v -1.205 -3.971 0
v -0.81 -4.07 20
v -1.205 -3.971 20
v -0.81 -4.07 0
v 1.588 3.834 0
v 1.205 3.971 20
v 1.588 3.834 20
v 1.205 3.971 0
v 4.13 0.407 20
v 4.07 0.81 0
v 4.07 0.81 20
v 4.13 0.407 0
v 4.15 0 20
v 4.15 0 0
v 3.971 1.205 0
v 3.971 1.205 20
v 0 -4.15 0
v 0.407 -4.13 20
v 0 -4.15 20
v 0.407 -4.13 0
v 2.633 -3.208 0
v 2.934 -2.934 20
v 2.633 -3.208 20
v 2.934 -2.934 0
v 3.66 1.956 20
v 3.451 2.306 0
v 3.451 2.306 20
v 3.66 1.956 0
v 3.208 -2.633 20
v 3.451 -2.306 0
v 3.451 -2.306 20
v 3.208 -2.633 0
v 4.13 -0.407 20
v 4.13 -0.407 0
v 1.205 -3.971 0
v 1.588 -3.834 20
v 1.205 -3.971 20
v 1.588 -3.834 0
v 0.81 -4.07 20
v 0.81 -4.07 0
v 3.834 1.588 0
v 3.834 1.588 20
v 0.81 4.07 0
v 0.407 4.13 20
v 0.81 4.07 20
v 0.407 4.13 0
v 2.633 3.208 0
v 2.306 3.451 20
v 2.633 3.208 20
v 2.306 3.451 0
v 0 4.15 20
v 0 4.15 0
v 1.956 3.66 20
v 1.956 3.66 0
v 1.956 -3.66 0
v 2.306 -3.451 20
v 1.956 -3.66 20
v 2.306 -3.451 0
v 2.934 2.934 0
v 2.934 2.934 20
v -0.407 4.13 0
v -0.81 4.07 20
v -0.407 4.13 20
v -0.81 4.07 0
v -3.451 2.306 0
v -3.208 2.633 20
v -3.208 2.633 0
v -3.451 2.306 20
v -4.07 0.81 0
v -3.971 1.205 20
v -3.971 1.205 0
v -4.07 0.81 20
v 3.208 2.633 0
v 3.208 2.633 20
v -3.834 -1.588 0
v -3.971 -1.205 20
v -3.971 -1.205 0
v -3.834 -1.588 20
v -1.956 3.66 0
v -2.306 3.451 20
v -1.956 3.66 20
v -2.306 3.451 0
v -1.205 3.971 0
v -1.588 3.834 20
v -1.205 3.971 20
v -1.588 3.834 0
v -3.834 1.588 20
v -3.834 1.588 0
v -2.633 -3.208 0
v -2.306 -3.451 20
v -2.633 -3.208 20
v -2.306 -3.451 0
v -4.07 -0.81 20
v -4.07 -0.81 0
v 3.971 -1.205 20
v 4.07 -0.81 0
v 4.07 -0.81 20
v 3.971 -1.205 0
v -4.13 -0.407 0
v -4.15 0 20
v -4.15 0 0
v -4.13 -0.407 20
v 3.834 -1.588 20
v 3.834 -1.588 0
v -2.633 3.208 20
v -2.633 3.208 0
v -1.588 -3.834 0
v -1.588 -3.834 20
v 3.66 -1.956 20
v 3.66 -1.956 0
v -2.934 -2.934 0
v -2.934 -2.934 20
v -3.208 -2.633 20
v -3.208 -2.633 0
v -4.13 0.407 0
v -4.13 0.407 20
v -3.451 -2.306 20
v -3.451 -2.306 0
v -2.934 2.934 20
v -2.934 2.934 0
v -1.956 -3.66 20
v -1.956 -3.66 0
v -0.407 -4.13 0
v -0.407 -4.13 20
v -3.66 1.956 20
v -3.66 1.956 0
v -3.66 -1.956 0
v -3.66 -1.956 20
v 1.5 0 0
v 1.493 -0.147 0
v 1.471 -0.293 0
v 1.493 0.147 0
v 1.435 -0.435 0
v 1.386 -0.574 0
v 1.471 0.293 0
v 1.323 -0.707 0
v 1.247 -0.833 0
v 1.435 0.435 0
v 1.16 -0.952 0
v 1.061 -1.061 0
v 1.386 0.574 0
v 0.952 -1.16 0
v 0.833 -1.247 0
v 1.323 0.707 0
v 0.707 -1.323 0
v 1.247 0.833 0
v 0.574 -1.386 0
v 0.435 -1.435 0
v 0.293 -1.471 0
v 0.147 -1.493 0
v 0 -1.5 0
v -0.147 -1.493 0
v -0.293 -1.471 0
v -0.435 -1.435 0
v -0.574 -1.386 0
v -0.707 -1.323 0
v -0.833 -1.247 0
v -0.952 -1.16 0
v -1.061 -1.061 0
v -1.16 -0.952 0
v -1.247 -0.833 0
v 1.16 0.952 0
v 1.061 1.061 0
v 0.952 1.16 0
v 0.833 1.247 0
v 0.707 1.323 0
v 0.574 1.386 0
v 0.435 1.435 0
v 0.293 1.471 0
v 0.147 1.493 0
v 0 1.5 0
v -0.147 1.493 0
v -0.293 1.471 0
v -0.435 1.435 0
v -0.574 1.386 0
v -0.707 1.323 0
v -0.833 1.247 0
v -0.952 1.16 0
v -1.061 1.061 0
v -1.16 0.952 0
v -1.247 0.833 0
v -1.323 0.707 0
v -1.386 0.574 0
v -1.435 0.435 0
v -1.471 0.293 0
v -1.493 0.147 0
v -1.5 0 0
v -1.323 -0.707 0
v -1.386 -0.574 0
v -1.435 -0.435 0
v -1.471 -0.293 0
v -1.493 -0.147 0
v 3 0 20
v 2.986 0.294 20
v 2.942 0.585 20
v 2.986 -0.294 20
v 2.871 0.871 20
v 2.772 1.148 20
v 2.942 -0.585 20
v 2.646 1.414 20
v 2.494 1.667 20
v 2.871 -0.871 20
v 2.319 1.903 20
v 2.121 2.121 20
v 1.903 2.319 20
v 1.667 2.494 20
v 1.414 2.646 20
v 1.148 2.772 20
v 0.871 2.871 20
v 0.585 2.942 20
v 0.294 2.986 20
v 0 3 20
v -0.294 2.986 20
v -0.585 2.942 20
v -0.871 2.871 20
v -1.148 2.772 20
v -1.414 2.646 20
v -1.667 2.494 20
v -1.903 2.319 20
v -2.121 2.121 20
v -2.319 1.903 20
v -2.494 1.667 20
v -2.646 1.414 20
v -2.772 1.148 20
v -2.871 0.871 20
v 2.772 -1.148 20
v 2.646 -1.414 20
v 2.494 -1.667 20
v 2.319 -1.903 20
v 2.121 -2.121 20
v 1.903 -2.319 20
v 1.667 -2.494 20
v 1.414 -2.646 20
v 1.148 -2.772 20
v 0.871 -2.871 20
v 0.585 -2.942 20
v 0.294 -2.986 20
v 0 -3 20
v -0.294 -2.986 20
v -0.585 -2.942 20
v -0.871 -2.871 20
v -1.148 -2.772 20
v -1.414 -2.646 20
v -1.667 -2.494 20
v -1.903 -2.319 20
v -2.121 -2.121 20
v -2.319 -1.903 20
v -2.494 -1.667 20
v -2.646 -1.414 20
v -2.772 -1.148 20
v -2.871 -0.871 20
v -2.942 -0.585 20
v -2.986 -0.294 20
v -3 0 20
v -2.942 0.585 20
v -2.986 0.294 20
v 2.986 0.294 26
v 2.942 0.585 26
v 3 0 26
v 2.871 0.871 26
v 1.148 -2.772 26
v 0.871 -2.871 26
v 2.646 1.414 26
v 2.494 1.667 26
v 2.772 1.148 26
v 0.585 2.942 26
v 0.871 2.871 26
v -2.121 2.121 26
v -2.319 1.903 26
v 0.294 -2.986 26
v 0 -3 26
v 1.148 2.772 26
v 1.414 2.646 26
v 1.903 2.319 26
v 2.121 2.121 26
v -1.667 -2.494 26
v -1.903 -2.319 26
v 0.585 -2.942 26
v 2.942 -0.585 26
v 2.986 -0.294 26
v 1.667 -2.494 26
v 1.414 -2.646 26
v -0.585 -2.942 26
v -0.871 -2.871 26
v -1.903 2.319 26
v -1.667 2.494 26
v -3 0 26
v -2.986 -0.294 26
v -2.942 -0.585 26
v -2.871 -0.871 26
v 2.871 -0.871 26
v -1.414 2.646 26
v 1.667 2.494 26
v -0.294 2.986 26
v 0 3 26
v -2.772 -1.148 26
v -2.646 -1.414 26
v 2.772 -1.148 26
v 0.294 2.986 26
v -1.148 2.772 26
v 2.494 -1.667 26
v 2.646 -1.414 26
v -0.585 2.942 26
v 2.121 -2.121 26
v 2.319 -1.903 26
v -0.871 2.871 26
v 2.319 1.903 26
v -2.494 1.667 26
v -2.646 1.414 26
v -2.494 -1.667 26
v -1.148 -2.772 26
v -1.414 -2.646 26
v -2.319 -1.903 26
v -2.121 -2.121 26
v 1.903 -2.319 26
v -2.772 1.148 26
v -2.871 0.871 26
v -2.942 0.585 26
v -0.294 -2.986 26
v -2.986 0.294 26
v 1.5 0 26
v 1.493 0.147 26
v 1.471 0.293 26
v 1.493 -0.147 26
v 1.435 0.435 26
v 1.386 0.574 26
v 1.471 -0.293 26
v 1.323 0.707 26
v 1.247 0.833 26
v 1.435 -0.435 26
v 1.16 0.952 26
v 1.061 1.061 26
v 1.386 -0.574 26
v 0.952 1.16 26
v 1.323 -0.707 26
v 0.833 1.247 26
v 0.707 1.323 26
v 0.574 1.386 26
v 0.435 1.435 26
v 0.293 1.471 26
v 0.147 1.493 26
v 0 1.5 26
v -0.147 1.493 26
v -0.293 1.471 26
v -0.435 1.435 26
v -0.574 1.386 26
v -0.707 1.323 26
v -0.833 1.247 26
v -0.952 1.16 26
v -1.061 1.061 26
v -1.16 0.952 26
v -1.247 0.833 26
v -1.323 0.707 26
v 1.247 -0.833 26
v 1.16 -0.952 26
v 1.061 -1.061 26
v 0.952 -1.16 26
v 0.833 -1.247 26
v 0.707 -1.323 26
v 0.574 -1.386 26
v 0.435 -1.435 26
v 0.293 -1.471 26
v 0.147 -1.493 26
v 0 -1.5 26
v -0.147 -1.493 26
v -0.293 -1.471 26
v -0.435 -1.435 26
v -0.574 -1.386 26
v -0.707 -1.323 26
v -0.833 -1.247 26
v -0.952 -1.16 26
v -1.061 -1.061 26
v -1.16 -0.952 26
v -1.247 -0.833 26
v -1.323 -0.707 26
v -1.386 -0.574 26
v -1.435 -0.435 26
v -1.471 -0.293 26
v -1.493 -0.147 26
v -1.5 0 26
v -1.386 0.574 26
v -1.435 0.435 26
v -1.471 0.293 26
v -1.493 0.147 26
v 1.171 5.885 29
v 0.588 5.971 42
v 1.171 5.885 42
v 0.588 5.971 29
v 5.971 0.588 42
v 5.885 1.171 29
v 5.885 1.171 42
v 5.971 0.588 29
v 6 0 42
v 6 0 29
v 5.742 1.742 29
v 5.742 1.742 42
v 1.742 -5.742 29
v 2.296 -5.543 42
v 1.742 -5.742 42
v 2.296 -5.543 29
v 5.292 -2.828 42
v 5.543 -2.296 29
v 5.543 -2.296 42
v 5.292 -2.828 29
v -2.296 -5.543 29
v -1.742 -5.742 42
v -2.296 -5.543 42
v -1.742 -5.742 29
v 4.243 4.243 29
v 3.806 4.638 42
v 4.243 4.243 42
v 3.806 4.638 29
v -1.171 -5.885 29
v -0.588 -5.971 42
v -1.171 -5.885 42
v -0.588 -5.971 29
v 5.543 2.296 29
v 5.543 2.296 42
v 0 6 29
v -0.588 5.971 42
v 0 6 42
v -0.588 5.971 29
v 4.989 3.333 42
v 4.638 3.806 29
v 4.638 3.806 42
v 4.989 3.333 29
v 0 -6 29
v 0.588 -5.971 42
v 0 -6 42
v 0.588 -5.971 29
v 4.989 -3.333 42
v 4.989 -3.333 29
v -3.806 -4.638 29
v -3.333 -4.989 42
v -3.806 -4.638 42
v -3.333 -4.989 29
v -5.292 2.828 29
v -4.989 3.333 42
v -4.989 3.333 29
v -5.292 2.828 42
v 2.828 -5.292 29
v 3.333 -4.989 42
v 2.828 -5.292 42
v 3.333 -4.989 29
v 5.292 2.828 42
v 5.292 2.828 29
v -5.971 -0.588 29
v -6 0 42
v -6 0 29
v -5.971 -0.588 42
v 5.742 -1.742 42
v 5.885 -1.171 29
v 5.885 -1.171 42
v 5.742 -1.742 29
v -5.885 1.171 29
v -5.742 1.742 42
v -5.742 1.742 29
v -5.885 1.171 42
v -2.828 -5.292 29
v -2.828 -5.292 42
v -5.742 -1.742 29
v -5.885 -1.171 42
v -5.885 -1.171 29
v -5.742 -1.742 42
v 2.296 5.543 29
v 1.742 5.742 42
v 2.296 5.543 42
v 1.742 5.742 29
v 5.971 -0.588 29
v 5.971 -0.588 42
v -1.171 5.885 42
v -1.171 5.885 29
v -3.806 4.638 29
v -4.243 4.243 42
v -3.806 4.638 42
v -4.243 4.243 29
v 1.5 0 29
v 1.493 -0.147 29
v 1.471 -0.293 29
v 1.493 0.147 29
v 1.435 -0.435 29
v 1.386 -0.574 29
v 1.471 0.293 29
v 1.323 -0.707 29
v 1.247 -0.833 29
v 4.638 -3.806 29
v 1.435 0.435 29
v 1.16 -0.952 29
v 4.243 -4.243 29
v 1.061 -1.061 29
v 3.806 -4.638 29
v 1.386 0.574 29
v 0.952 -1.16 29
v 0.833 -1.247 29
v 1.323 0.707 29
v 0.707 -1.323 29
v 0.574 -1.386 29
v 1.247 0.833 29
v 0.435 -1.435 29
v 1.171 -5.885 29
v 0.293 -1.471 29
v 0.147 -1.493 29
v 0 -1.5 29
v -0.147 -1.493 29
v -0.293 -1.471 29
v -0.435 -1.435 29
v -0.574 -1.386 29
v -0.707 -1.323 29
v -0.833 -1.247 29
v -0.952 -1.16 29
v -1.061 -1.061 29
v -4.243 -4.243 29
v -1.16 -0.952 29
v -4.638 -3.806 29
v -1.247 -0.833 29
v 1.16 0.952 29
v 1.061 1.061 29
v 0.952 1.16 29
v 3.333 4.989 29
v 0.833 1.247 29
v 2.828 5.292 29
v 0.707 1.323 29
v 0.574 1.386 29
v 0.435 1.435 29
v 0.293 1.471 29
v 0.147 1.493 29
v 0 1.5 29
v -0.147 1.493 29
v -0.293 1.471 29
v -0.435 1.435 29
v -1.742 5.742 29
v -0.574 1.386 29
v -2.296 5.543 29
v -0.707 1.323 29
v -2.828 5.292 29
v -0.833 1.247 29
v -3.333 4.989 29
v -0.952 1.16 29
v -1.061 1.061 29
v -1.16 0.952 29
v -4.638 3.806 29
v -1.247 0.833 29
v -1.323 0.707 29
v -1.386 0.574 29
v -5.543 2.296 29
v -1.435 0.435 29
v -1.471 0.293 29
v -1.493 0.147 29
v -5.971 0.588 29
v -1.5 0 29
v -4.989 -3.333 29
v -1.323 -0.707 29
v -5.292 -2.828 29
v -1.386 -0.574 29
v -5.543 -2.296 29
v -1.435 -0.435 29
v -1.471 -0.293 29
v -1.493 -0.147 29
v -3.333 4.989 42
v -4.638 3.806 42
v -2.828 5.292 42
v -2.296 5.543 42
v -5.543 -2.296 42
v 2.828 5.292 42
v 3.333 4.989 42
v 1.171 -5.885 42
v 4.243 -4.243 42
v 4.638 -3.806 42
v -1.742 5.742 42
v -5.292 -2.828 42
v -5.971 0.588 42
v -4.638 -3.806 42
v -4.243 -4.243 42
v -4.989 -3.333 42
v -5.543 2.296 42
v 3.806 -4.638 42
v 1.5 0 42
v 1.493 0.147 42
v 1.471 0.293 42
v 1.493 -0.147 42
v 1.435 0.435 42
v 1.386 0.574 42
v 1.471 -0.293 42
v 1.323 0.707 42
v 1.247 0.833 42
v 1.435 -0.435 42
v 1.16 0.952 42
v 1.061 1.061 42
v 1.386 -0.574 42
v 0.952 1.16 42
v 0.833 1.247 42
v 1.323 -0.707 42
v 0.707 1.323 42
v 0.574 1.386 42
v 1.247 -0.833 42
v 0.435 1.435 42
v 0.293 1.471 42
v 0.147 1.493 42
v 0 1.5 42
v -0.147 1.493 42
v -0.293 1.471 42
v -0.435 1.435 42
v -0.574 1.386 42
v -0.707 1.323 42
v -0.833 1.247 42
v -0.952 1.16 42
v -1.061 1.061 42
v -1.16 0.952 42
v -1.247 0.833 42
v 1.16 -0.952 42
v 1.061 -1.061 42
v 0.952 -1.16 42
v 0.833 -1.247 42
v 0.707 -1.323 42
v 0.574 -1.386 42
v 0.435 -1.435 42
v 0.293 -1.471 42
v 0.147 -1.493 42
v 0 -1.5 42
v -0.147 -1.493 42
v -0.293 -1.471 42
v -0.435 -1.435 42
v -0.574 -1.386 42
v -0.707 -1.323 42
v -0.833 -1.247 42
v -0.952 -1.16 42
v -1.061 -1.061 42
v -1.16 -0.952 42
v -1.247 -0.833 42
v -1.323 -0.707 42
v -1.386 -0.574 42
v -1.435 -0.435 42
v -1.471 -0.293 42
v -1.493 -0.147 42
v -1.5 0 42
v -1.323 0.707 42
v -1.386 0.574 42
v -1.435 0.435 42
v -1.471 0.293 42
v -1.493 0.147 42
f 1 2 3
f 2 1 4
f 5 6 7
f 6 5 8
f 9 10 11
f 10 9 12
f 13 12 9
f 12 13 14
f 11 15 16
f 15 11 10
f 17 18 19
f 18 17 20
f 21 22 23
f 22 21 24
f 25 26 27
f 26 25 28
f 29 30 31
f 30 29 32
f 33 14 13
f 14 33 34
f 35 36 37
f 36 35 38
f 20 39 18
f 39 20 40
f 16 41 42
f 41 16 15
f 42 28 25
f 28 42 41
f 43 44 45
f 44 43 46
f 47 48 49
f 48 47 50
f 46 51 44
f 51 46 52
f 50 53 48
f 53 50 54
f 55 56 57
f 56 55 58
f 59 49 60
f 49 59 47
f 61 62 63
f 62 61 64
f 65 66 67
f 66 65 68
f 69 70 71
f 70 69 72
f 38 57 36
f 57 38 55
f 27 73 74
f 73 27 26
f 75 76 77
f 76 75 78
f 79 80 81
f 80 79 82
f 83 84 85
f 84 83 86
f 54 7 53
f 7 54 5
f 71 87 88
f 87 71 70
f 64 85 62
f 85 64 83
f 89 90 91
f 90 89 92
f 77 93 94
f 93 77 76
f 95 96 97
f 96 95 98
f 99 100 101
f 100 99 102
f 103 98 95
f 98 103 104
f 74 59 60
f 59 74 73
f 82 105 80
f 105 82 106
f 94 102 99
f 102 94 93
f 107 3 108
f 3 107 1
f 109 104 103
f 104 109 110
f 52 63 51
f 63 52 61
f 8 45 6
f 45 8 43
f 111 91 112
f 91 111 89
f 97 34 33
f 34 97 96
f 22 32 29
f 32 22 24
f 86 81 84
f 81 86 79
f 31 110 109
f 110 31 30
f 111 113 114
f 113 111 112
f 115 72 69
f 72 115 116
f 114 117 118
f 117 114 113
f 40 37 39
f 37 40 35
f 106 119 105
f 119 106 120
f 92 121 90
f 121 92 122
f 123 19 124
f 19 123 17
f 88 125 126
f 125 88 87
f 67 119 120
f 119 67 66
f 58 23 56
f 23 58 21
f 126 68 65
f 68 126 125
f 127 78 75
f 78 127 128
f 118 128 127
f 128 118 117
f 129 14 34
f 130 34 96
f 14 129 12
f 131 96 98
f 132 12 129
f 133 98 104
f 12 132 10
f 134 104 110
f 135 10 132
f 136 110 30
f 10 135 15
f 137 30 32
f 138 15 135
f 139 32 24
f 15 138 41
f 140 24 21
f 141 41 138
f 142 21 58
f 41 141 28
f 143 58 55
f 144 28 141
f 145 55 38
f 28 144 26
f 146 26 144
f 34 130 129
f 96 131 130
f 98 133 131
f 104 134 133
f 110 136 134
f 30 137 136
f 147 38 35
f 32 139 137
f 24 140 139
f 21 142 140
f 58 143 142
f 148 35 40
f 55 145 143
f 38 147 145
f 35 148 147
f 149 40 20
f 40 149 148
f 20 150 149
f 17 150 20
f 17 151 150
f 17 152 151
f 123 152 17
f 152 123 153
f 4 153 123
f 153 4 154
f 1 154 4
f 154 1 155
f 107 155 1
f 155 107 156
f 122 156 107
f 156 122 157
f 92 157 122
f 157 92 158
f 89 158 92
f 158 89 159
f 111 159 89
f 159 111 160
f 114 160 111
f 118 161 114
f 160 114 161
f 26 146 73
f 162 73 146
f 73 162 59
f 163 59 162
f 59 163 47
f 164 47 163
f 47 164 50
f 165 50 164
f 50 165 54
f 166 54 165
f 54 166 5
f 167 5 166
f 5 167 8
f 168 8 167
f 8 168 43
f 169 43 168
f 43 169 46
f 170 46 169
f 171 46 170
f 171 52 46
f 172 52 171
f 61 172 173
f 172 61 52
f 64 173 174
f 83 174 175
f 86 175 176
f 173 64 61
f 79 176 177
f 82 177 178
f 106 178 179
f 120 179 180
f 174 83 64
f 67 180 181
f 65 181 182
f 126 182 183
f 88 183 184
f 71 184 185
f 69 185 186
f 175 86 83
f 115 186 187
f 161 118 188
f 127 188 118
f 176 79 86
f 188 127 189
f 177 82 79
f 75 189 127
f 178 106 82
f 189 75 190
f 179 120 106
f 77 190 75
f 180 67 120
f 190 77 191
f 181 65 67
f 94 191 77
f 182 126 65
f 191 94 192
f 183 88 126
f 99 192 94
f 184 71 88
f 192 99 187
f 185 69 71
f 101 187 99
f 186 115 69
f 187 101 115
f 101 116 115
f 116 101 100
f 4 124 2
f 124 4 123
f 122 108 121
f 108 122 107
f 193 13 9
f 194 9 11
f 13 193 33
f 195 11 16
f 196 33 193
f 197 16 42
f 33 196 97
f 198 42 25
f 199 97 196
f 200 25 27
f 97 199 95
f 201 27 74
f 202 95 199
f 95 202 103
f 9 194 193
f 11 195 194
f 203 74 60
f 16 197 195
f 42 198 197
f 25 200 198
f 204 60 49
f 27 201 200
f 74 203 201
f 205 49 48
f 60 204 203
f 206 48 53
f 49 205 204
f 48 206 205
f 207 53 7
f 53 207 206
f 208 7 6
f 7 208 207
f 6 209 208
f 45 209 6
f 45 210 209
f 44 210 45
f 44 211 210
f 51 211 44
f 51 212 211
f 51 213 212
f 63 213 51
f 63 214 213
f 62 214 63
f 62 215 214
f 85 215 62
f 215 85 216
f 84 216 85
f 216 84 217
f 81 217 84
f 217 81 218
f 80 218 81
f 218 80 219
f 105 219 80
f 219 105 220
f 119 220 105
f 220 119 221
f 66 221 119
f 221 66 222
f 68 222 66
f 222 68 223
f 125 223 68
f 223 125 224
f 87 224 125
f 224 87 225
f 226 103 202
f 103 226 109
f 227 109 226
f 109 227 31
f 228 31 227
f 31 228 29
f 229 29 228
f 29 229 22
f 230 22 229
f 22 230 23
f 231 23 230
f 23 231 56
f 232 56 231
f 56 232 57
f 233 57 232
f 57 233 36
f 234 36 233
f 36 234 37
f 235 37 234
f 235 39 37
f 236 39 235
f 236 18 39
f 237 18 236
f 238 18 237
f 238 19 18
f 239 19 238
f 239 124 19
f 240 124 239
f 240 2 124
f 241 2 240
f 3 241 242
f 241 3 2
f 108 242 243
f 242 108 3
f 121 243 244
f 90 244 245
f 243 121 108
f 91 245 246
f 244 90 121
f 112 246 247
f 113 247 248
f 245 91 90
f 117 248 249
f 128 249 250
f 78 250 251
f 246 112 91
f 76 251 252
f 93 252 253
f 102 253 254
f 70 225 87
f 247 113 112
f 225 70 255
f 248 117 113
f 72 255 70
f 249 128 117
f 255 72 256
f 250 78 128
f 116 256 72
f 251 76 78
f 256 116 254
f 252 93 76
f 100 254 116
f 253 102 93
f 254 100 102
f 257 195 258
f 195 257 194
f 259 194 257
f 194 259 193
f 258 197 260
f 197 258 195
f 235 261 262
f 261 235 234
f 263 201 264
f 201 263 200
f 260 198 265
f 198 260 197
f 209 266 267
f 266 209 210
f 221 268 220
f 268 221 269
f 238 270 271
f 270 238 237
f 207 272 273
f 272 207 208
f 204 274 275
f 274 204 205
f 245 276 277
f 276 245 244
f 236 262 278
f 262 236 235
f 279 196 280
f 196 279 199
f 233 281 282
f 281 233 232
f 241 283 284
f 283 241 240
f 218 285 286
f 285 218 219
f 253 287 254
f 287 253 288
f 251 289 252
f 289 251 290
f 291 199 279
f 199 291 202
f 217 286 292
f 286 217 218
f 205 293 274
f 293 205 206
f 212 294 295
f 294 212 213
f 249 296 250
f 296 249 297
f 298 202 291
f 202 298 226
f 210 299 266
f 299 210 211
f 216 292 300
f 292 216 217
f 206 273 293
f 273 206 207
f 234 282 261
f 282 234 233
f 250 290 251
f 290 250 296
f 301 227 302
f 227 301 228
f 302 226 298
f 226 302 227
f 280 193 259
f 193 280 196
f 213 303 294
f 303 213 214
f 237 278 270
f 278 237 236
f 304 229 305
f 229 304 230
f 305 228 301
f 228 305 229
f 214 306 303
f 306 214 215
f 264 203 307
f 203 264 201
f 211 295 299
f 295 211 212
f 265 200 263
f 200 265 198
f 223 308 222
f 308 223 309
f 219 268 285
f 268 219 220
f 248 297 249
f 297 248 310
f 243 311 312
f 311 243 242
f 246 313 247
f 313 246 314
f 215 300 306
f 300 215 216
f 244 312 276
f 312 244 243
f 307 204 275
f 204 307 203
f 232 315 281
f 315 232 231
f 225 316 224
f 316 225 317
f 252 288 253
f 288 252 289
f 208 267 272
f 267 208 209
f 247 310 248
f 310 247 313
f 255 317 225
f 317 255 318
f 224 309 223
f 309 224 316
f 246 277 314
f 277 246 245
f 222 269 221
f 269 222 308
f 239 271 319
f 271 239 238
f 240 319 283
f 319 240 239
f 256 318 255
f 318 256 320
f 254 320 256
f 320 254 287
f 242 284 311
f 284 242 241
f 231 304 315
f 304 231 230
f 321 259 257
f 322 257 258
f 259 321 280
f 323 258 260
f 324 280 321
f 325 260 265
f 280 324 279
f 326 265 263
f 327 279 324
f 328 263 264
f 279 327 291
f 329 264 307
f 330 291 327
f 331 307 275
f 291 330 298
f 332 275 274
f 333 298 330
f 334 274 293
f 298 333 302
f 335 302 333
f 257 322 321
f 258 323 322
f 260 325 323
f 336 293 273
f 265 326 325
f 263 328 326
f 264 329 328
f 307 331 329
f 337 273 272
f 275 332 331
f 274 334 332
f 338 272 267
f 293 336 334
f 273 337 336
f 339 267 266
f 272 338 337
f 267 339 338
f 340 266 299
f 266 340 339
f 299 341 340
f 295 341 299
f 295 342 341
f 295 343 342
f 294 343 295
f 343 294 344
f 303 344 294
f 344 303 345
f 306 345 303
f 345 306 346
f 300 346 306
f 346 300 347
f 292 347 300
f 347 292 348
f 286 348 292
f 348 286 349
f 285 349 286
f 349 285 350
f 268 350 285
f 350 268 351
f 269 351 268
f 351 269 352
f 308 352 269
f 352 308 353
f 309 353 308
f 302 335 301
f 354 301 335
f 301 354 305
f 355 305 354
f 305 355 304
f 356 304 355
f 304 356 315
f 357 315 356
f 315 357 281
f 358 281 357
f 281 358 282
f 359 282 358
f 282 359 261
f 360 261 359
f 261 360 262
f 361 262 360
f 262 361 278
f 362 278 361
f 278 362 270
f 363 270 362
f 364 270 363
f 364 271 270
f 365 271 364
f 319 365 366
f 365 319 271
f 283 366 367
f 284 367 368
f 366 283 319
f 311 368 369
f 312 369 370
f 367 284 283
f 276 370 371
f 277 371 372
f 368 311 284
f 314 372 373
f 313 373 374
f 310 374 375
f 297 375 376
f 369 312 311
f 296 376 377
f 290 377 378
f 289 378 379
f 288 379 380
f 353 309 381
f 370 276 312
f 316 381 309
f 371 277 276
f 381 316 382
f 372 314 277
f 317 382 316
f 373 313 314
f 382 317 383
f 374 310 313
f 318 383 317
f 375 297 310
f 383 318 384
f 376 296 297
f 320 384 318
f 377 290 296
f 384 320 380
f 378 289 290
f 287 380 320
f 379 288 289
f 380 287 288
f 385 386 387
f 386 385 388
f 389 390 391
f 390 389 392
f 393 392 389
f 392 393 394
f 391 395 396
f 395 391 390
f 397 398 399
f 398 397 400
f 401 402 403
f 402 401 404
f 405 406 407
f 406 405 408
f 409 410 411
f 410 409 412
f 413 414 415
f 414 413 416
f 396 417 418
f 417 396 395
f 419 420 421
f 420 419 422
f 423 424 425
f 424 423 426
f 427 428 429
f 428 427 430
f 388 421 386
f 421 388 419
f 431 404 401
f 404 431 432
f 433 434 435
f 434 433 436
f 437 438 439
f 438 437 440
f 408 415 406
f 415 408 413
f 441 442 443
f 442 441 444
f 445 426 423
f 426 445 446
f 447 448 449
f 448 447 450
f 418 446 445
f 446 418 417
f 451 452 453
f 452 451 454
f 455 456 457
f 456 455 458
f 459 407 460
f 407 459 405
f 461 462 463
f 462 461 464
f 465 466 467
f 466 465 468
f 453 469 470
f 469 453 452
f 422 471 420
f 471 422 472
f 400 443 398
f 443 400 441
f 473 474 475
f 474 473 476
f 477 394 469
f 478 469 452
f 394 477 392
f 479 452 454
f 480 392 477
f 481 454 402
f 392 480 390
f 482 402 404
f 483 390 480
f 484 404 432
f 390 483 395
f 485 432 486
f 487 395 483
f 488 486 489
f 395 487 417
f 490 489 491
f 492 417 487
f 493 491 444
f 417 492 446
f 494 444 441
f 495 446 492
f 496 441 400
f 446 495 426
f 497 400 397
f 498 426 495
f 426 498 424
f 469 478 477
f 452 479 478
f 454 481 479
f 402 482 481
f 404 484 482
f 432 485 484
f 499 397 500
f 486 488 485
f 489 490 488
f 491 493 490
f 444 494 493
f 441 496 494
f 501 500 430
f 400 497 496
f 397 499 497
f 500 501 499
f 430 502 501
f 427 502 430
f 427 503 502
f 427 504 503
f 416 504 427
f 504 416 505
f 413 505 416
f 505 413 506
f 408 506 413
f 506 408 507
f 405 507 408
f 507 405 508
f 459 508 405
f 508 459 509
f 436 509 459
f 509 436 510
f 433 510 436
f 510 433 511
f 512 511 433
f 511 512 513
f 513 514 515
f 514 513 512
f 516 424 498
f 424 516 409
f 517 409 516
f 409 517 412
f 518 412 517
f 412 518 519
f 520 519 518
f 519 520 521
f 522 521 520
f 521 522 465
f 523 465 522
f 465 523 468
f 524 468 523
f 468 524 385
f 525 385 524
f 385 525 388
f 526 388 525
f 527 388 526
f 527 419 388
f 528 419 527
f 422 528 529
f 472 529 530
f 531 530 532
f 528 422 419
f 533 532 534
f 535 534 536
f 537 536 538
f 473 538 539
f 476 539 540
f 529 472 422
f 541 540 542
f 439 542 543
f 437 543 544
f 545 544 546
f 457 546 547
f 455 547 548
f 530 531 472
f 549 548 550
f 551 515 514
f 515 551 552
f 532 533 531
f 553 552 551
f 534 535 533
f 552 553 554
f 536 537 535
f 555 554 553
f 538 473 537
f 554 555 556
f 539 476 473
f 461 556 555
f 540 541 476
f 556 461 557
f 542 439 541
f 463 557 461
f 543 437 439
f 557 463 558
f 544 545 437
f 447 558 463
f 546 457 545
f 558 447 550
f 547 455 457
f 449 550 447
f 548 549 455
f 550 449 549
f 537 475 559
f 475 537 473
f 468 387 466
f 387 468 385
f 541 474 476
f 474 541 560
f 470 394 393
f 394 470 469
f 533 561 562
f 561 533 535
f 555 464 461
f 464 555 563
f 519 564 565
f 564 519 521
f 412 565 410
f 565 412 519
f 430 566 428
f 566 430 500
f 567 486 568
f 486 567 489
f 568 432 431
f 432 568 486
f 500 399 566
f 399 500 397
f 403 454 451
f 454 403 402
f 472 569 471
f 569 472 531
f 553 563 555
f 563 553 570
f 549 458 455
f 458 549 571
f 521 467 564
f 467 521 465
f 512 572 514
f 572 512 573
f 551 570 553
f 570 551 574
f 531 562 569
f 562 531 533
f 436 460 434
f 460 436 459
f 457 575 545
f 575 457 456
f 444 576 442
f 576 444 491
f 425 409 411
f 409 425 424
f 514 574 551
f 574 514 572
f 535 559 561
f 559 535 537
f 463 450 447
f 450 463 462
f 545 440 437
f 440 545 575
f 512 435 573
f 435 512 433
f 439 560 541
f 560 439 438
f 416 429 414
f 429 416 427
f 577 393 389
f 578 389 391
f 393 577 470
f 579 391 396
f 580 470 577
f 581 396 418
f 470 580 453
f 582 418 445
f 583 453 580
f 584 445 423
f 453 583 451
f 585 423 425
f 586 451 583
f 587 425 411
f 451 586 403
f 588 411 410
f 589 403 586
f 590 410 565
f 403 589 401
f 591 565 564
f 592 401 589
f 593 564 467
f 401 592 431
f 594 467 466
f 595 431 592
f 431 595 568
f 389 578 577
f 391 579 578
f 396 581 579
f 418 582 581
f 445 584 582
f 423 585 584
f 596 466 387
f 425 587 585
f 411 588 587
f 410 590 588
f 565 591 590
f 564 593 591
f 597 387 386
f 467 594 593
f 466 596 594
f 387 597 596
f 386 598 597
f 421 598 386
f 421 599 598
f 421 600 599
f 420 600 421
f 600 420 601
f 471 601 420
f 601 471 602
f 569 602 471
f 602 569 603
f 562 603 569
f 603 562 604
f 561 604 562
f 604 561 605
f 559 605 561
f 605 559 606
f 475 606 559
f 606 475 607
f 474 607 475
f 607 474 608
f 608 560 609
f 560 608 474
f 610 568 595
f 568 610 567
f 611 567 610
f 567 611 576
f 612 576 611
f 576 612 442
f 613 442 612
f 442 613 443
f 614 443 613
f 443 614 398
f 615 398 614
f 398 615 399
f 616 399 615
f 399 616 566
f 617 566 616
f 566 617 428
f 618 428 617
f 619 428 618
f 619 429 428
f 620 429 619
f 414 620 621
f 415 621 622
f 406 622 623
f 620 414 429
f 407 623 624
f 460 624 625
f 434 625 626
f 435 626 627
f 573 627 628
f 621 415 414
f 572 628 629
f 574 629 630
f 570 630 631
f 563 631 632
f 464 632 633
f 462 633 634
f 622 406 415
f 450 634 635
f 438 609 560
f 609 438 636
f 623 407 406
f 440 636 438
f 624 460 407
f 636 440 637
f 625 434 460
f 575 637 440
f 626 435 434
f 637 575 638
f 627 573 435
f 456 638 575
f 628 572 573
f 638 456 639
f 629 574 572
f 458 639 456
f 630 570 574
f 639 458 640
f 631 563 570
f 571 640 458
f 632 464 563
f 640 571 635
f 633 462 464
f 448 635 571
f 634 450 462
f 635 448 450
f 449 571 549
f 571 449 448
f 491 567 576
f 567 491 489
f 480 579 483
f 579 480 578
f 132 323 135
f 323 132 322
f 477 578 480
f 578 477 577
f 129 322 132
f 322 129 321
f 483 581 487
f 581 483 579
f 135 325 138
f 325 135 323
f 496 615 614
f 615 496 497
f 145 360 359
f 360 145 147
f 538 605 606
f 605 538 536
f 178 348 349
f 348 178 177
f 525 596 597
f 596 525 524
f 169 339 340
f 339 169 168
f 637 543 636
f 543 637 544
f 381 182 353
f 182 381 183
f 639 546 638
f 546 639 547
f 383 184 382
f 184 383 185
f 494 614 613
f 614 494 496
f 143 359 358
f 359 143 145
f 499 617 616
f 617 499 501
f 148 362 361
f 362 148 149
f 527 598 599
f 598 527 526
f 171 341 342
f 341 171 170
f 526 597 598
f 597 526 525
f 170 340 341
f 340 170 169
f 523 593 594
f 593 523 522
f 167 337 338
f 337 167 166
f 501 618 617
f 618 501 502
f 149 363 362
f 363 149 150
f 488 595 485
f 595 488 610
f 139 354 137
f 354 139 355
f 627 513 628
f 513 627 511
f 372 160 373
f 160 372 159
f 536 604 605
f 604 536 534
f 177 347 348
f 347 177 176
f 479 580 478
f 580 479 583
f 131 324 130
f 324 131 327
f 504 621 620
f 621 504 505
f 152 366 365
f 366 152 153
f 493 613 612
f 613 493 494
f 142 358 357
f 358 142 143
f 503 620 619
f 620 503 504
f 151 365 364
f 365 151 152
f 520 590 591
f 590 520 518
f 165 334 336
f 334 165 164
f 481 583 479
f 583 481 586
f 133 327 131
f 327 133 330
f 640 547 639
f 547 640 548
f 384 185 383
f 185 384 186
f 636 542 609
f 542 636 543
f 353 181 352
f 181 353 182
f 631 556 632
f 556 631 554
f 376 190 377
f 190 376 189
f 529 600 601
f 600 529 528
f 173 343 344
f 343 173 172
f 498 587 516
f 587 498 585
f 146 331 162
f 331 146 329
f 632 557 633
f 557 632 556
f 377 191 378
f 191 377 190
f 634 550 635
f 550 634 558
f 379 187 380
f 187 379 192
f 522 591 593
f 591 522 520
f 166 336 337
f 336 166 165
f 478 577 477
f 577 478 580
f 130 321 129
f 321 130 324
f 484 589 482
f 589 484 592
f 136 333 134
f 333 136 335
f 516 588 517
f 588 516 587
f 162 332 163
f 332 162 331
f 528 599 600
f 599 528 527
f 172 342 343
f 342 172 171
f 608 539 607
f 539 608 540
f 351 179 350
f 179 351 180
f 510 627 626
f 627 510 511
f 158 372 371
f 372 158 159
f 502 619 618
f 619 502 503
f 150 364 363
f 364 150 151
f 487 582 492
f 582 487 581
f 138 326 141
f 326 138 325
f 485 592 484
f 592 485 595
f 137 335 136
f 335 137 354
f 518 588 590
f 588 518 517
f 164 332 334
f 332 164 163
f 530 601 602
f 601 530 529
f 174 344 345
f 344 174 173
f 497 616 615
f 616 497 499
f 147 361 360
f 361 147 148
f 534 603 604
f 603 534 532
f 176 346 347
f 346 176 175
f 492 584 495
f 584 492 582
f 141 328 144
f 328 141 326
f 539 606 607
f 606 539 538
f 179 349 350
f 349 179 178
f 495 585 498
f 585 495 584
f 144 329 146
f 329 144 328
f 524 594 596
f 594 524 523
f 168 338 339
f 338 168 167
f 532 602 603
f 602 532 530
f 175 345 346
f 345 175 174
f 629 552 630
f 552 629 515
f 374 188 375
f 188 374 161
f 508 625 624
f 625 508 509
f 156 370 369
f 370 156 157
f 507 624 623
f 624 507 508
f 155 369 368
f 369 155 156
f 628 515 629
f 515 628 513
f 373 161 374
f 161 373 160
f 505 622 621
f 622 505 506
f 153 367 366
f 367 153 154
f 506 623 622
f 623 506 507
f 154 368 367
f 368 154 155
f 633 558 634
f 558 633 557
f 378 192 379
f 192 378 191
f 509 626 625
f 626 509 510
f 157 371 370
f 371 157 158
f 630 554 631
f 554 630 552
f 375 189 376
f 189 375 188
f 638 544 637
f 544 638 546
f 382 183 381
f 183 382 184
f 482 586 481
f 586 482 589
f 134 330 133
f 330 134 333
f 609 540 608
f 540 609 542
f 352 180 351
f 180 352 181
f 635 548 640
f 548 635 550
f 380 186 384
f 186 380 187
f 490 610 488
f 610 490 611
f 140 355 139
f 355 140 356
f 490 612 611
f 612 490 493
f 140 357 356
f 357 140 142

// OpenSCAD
// Hose barb reducer - a straight (axial) reducer that joins two silicone tube sizes via
// stacked barbs, with a through-bore. The two barb sections are held in a cylindrical
// collar. NOVEL general part (a generic reducer, not any one labware item).
//

t1   = 8;
t2   = 5;
bore = 3;
L    = 41;
coll = 12;

$fn = 64;

barb_d1 = 7.5 + (t1 * 0.1);     // top of the larger barbs
barb_d2 = 7.5;
g1      = min(bore, t2 * 0.7);   // clearance bore through the larger section
barb_h1 = 10;

barb_d3 = 6.5 - (t2 * 0.1);     // top of the smaller barbs
barb_d4 = 5.0;
g2      = min(bore, t1 * 0.7);   // clearance bore through the smaller section
barb_h2 = 8;

difference() {
    union() {
        for (z = [0, barb_h1])
            translate([0, 0, z])
                cylinder(h = barb_h1, d = barb_d1);              // upper barb
        for (z = [barb_h1, barb_h1 + barb_h2])
            translate([0, 0, z])
                cylinder(h = barb_h2, d = barb_d3);              // lower barb
        translate([0, 0, L - coll]) cylinder(h = coll + 1, d = coll);                 // collar
    }
    translate([0, 0, -1]) cylinder(h = L + 2, d = bore);                 // through-bore
}
